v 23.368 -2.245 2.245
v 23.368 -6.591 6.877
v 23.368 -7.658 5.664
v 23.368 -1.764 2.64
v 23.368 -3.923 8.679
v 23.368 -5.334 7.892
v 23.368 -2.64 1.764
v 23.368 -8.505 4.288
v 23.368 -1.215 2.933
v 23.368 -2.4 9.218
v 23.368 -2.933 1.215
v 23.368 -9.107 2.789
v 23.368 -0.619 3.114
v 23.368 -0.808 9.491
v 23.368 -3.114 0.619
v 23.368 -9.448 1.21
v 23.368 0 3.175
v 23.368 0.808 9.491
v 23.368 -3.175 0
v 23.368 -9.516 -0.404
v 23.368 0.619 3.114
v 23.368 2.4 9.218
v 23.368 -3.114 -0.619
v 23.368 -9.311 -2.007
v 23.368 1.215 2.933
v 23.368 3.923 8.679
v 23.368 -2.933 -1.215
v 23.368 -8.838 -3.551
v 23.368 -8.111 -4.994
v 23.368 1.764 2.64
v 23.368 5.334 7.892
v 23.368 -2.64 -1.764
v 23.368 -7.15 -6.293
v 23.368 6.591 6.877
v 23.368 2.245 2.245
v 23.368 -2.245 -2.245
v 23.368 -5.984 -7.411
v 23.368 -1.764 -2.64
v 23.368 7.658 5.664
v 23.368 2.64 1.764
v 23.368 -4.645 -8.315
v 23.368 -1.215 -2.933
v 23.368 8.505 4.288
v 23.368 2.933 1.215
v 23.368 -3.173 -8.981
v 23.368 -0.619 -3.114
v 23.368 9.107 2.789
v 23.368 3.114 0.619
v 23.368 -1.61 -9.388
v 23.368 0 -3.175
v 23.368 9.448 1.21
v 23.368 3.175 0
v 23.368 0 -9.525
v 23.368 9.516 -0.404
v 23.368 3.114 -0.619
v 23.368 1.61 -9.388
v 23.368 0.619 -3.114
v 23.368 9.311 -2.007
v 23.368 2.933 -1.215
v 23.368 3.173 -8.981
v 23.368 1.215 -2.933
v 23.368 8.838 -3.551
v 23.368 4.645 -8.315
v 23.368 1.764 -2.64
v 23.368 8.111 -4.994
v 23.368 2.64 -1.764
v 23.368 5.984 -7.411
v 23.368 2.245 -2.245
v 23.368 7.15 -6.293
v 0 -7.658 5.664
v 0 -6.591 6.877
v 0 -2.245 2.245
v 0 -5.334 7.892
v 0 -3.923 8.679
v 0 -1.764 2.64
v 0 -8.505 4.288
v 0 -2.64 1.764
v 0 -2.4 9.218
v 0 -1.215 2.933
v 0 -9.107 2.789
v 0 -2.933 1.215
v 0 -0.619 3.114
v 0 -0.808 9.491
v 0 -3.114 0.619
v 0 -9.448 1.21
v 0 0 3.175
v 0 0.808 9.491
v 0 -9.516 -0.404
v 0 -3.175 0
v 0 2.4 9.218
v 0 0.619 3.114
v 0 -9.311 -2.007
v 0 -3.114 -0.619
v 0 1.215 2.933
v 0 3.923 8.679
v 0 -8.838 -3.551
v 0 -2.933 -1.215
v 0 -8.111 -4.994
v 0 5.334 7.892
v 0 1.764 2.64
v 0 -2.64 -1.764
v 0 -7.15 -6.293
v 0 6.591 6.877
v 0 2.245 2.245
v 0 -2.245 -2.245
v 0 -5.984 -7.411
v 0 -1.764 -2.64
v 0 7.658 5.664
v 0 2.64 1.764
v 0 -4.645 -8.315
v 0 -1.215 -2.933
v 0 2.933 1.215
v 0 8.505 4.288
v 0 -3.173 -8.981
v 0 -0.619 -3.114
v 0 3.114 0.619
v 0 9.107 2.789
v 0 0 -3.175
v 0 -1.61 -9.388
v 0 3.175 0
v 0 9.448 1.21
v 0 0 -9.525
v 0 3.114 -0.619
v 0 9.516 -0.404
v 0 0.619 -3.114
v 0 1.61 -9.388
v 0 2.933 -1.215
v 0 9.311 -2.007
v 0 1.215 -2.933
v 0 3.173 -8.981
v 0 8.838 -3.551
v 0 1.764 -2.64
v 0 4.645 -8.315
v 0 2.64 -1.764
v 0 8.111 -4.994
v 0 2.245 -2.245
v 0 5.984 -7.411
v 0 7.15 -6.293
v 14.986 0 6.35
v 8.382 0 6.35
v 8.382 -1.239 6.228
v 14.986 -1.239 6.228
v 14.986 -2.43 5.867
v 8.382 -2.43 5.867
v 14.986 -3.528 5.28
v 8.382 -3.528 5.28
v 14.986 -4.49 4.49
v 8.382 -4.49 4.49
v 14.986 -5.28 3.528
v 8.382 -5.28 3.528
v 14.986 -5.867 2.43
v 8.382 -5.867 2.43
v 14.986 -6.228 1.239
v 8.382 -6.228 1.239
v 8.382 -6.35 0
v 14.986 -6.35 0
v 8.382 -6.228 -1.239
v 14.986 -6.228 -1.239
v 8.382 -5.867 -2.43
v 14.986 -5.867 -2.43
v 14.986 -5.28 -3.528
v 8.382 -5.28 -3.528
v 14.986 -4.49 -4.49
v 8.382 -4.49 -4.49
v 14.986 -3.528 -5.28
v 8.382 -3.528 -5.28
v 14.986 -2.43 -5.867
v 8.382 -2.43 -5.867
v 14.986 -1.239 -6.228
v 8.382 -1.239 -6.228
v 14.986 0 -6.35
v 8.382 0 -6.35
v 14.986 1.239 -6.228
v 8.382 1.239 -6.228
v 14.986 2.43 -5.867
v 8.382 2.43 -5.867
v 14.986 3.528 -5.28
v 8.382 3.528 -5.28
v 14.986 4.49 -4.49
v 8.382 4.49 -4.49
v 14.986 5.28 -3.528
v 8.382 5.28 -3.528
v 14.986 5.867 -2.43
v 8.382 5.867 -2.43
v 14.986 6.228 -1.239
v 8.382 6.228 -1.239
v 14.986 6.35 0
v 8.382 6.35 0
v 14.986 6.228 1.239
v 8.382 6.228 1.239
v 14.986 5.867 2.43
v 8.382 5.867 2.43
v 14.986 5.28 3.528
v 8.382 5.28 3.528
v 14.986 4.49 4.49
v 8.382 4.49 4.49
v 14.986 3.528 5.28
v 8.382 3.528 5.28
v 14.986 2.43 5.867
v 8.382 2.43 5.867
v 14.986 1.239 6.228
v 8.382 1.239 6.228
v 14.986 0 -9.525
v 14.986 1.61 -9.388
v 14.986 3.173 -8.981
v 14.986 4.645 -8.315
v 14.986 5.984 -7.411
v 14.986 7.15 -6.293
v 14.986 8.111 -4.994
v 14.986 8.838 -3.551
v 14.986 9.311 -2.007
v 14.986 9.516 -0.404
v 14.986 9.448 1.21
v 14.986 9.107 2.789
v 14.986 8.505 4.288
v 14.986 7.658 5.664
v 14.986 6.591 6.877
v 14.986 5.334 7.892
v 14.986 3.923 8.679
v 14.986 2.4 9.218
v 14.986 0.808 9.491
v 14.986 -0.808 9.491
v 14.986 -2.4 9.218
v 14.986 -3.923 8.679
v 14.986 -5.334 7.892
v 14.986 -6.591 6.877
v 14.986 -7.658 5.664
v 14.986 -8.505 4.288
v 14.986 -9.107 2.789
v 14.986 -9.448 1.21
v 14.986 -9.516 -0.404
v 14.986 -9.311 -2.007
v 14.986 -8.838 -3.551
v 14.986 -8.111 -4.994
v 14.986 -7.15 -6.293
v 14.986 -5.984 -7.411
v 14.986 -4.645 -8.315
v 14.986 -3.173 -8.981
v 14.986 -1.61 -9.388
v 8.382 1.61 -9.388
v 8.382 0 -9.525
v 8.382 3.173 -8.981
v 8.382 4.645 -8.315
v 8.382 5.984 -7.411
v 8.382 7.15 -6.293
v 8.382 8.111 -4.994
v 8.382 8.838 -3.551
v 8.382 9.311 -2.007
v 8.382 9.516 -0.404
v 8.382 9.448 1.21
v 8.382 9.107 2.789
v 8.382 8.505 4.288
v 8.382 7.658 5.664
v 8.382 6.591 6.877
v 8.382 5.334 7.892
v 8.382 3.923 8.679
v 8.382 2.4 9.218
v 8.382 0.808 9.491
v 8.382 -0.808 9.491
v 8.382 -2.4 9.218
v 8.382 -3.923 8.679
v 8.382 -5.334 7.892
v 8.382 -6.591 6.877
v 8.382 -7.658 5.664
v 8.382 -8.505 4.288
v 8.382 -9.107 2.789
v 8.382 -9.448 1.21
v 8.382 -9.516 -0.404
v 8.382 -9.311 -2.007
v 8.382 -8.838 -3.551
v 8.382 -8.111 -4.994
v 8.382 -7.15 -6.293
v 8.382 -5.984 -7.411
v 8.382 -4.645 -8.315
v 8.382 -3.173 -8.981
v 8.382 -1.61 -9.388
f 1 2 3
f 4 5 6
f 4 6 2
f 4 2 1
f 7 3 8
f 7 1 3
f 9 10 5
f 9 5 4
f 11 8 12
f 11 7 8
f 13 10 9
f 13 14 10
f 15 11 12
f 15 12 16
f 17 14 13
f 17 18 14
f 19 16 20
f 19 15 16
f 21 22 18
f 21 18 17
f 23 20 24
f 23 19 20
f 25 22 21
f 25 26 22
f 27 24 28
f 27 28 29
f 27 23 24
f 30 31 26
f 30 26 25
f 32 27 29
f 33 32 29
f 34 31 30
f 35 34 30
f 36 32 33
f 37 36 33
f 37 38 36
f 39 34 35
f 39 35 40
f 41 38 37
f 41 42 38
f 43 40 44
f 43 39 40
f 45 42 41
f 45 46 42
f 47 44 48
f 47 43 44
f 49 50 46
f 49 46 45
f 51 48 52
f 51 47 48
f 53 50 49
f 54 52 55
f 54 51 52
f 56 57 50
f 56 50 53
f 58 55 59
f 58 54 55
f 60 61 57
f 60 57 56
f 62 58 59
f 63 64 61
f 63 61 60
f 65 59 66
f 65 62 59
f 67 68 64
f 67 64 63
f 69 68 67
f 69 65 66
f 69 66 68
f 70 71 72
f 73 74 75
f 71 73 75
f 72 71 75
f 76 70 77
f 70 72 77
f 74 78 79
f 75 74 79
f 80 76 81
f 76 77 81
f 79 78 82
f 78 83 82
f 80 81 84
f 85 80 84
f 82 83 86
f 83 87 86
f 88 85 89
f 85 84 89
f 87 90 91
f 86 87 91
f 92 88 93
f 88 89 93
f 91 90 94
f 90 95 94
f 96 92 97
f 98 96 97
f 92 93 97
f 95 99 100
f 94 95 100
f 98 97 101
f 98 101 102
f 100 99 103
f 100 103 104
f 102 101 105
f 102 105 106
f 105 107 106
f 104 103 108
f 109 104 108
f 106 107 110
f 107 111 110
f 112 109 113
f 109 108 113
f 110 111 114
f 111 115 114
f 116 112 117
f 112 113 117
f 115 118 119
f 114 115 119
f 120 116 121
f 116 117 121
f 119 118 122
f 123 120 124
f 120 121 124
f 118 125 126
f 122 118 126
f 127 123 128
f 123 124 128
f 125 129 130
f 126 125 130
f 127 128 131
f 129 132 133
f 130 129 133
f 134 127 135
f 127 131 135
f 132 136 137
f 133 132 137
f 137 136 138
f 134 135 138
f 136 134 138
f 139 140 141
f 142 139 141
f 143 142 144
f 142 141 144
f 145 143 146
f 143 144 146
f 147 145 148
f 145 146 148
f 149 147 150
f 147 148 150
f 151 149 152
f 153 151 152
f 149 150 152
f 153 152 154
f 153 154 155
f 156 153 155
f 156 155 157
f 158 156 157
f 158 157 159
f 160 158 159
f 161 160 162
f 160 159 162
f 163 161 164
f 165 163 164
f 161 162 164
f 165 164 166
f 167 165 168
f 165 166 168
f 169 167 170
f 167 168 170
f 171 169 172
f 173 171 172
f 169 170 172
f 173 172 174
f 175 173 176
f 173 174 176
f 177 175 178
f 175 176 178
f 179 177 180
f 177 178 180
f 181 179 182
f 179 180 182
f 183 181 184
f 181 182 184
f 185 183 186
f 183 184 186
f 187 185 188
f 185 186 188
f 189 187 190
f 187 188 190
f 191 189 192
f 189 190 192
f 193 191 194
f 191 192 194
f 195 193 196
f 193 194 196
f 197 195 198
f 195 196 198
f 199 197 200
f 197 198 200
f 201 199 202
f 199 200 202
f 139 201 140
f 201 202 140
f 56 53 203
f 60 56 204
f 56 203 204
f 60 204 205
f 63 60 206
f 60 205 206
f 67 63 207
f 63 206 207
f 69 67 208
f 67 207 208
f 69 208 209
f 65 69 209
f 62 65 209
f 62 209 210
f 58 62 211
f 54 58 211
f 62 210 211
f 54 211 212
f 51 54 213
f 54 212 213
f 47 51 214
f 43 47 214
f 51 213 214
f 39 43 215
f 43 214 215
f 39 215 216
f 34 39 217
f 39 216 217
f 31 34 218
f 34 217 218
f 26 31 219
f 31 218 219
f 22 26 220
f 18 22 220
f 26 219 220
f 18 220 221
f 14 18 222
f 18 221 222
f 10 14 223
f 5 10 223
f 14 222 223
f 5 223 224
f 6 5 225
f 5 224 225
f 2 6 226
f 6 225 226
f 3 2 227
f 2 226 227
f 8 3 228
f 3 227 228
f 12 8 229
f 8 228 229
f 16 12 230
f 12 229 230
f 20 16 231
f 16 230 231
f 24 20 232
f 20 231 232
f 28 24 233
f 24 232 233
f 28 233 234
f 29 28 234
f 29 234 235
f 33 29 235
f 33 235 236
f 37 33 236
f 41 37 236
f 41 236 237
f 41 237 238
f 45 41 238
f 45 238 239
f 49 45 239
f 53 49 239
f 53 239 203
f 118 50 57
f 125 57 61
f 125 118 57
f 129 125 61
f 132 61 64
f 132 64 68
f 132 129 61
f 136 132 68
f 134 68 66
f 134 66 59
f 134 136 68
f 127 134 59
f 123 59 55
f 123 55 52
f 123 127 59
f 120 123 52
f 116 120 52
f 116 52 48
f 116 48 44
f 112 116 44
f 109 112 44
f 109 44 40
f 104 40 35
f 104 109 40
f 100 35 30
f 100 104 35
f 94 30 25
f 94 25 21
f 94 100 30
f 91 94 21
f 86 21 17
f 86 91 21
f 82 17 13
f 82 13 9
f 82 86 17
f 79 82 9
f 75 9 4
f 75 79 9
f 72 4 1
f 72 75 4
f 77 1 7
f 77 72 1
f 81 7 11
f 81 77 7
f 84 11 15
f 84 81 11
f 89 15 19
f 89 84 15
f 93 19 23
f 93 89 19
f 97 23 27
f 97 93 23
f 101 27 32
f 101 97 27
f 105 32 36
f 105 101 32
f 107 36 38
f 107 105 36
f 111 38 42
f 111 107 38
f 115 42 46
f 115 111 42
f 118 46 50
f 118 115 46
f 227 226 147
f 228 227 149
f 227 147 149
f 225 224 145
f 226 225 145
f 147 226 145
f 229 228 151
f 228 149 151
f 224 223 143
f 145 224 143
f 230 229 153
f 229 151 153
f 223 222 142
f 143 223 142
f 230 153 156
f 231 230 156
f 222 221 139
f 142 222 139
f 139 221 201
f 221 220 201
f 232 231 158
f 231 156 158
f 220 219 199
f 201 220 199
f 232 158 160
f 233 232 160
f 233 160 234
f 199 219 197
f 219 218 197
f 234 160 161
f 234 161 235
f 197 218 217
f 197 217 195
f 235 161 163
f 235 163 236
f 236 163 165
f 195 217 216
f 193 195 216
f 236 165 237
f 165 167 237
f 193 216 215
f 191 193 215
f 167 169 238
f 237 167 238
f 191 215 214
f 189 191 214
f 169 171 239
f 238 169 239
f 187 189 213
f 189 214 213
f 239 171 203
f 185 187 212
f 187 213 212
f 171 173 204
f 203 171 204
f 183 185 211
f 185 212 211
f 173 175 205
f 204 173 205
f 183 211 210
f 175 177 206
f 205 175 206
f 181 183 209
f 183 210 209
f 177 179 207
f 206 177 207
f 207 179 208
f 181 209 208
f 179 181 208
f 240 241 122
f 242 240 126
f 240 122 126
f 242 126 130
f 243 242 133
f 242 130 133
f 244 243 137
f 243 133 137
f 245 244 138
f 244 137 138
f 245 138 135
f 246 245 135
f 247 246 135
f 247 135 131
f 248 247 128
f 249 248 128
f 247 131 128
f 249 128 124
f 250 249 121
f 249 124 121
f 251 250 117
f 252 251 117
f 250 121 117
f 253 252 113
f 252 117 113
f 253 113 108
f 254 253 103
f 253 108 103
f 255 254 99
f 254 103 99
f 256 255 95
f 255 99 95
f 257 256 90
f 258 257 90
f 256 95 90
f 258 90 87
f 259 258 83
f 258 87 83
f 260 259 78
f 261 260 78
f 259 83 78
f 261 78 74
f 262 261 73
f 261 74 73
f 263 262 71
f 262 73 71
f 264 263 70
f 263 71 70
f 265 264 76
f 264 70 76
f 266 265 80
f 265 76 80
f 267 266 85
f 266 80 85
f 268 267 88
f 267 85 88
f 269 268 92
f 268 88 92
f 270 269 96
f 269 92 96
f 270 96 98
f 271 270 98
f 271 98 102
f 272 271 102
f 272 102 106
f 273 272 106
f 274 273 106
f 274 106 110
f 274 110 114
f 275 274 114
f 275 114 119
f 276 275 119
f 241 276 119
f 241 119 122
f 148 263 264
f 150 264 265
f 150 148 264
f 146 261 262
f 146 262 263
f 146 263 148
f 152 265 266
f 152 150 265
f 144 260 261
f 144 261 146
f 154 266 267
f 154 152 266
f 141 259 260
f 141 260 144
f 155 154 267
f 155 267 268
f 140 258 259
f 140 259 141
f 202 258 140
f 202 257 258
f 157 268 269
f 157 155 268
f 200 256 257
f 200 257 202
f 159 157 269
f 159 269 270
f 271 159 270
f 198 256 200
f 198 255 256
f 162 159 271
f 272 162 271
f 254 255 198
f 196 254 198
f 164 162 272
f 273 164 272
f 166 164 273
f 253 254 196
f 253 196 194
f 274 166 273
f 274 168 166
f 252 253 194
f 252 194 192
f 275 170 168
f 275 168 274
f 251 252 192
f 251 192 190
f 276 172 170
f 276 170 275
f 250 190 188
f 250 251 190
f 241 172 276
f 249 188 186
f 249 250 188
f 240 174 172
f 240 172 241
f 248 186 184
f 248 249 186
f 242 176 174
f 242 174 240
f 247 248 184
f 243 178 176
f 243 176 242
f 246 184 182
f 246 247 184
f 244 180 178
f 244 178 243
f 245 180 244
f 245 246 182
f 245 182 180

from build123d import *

# Parameters (mm, degrees)
SKETCH1_R           = 9.525
SKETCH1_R_2         = 3.175
BOSS_EXTRUDE1_DEPTH = 8.382
SKETCH2_R           = 6.35
SKETCH2_R_2         = 3.175
BOSS_EXTRUDE2_DEPTH = 6.604
SKETCH3_R           = 9.525
SKETCH3_R_2         = 3.175
BOSS_EXTRUDE3_DEPTH = 8.382


with BuildPart() as part:
    # Sketch1 → Boss-Extrude1 (new body)
    with BuildSketch(Plane(origin=(0, 0, 0), x_dir=(0, 0, -1), z_dir=(1, 0, 0))):
        Circle(SKETCH1_R)
        Circle(SKETCH1_R_2, mode=Mode.SUBTRACT)
    extrude(amount=BOSS_EXTRUDE1_DEPTH)

    # Sketch2 → Boss-Extrude2 (add)
    with BuildSketch(Plane(origin=(8.382, 0, 0), x_dir=(0, 0, -1), z_dir=(1, 0, 0))):
        with Locations(Location((0, 0, 0), (0, 0, 180))):
            Circle(SKETCH2_R)
        Circle(SKETCH2_R_2, mode=Mode.SUBTRACT)
    extrude(amount=BOSS_EXTRUDE2_DEPTH)

    # Sketch3 → Boss-Extrude3 (add)
    with BuildSketch(Plane(origin=(14.986, 0, 0), x_dir=(0, 0, -1), z_dir=(1, 0, 0))):
        Circle(SKETCH3_R)
        Circle(SKETCH3_R_2, mode=Mode.SUBTRACT)
    extrude(amount=BOSS_EXTRUDE3_DEPTH)


solid = part.part
